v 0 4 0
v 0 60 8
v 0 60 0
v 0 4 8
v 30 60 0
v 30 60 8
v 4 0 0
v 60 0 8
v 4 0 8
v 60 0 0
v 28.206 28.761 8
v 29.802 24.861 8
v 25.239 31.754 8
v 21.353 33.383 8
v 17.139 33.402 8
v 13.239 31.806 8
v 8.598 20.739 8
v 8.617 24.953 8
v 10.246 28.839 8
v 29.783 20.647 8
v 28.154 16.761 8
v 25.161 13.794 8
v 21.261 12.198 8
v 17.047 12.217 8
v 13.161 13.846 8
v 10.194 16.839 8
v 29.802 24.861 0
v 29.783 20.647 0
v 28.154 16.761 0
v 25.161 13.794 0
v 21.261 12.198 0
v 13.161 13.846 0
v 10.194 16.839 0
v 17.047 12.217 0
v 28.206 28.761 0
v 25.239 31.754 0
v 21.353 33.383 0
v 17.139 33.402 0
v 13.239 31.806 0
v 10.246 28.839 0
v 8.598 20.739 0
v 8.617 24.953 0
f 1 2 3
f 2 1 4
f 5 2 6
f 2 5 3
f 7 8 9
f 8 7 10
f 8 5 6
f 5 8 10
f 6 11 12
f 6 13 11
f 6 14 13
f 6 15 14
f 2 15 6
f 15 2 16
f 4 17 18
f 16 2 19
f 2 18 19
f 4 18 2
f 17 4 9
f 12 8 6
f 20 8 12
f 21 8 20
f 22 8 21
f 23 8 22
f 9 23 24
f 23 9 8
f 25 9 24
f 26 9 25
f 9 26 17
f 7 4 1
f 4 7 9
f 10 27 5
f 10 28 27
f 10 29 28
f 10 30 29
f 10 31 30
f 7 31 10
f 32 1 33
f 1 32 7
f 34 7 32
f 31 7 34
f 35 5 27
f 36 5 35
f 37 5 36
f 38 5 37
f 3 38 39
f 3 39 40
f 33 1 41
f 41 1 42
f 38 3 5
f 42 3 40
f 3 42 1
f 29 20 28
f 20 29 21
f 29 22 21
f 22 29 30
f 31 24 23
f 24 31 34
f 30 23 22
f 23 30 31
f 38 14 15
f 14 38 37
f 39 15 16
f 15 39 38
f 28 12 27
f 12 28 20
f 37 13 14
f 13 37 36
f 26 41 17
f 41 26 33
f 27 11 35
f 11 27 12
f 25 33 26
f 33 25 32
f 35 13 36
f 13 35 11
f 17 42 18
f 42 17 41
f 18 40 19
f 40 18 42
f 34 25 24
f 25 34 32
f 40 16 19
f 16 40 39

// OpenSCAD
$fn = 32;

// ----------------------------------------------------------------------
// Bracket plate: gusset 60 x 60
// ----------------------------------------------------------------------

// --- parameters (mm) ---
hole_r = 3;               // bolt hole radius
plate_t = 8;              // plate thickness, Z (extrusion height)
gus_a = 60;               // base length
gus_b = 60;               // height
top_x = 30;               // top edge X of the angled cut
light_r = 10.8;           // lightening hole radius

light_d = 2 * light_r;

profile = [[4, 0], [30, 0], [60, 0], [30, 60], [0, 60], [0, 4]];  // primary outline, 6 points, counter clockwise
void_1 = [[29.802, 24.861], [28.206, 28.761], [25.239, 31.754], [21.353, 33.383], [17.139, 33.402], [13.239, 31.806], [10.246, 28.839], [8.617, 24.953], [8.598, 20.739], [10.194, 16.839], [13.161, 13.846], [17.047, 12.217], [21.261, 12.198], [25.161, 13.794], [28.154, 16.761], [29.783, 20.647]];  // lightening hole, 16 points

// --- the one profile operation ---
difference() {
  linear_extrude(height = plate_t) polygon(points = profile);
  translate([0, 0, -1])
    linear_extrude(height = plate_t + 2) polygon(points = void_1);
}
